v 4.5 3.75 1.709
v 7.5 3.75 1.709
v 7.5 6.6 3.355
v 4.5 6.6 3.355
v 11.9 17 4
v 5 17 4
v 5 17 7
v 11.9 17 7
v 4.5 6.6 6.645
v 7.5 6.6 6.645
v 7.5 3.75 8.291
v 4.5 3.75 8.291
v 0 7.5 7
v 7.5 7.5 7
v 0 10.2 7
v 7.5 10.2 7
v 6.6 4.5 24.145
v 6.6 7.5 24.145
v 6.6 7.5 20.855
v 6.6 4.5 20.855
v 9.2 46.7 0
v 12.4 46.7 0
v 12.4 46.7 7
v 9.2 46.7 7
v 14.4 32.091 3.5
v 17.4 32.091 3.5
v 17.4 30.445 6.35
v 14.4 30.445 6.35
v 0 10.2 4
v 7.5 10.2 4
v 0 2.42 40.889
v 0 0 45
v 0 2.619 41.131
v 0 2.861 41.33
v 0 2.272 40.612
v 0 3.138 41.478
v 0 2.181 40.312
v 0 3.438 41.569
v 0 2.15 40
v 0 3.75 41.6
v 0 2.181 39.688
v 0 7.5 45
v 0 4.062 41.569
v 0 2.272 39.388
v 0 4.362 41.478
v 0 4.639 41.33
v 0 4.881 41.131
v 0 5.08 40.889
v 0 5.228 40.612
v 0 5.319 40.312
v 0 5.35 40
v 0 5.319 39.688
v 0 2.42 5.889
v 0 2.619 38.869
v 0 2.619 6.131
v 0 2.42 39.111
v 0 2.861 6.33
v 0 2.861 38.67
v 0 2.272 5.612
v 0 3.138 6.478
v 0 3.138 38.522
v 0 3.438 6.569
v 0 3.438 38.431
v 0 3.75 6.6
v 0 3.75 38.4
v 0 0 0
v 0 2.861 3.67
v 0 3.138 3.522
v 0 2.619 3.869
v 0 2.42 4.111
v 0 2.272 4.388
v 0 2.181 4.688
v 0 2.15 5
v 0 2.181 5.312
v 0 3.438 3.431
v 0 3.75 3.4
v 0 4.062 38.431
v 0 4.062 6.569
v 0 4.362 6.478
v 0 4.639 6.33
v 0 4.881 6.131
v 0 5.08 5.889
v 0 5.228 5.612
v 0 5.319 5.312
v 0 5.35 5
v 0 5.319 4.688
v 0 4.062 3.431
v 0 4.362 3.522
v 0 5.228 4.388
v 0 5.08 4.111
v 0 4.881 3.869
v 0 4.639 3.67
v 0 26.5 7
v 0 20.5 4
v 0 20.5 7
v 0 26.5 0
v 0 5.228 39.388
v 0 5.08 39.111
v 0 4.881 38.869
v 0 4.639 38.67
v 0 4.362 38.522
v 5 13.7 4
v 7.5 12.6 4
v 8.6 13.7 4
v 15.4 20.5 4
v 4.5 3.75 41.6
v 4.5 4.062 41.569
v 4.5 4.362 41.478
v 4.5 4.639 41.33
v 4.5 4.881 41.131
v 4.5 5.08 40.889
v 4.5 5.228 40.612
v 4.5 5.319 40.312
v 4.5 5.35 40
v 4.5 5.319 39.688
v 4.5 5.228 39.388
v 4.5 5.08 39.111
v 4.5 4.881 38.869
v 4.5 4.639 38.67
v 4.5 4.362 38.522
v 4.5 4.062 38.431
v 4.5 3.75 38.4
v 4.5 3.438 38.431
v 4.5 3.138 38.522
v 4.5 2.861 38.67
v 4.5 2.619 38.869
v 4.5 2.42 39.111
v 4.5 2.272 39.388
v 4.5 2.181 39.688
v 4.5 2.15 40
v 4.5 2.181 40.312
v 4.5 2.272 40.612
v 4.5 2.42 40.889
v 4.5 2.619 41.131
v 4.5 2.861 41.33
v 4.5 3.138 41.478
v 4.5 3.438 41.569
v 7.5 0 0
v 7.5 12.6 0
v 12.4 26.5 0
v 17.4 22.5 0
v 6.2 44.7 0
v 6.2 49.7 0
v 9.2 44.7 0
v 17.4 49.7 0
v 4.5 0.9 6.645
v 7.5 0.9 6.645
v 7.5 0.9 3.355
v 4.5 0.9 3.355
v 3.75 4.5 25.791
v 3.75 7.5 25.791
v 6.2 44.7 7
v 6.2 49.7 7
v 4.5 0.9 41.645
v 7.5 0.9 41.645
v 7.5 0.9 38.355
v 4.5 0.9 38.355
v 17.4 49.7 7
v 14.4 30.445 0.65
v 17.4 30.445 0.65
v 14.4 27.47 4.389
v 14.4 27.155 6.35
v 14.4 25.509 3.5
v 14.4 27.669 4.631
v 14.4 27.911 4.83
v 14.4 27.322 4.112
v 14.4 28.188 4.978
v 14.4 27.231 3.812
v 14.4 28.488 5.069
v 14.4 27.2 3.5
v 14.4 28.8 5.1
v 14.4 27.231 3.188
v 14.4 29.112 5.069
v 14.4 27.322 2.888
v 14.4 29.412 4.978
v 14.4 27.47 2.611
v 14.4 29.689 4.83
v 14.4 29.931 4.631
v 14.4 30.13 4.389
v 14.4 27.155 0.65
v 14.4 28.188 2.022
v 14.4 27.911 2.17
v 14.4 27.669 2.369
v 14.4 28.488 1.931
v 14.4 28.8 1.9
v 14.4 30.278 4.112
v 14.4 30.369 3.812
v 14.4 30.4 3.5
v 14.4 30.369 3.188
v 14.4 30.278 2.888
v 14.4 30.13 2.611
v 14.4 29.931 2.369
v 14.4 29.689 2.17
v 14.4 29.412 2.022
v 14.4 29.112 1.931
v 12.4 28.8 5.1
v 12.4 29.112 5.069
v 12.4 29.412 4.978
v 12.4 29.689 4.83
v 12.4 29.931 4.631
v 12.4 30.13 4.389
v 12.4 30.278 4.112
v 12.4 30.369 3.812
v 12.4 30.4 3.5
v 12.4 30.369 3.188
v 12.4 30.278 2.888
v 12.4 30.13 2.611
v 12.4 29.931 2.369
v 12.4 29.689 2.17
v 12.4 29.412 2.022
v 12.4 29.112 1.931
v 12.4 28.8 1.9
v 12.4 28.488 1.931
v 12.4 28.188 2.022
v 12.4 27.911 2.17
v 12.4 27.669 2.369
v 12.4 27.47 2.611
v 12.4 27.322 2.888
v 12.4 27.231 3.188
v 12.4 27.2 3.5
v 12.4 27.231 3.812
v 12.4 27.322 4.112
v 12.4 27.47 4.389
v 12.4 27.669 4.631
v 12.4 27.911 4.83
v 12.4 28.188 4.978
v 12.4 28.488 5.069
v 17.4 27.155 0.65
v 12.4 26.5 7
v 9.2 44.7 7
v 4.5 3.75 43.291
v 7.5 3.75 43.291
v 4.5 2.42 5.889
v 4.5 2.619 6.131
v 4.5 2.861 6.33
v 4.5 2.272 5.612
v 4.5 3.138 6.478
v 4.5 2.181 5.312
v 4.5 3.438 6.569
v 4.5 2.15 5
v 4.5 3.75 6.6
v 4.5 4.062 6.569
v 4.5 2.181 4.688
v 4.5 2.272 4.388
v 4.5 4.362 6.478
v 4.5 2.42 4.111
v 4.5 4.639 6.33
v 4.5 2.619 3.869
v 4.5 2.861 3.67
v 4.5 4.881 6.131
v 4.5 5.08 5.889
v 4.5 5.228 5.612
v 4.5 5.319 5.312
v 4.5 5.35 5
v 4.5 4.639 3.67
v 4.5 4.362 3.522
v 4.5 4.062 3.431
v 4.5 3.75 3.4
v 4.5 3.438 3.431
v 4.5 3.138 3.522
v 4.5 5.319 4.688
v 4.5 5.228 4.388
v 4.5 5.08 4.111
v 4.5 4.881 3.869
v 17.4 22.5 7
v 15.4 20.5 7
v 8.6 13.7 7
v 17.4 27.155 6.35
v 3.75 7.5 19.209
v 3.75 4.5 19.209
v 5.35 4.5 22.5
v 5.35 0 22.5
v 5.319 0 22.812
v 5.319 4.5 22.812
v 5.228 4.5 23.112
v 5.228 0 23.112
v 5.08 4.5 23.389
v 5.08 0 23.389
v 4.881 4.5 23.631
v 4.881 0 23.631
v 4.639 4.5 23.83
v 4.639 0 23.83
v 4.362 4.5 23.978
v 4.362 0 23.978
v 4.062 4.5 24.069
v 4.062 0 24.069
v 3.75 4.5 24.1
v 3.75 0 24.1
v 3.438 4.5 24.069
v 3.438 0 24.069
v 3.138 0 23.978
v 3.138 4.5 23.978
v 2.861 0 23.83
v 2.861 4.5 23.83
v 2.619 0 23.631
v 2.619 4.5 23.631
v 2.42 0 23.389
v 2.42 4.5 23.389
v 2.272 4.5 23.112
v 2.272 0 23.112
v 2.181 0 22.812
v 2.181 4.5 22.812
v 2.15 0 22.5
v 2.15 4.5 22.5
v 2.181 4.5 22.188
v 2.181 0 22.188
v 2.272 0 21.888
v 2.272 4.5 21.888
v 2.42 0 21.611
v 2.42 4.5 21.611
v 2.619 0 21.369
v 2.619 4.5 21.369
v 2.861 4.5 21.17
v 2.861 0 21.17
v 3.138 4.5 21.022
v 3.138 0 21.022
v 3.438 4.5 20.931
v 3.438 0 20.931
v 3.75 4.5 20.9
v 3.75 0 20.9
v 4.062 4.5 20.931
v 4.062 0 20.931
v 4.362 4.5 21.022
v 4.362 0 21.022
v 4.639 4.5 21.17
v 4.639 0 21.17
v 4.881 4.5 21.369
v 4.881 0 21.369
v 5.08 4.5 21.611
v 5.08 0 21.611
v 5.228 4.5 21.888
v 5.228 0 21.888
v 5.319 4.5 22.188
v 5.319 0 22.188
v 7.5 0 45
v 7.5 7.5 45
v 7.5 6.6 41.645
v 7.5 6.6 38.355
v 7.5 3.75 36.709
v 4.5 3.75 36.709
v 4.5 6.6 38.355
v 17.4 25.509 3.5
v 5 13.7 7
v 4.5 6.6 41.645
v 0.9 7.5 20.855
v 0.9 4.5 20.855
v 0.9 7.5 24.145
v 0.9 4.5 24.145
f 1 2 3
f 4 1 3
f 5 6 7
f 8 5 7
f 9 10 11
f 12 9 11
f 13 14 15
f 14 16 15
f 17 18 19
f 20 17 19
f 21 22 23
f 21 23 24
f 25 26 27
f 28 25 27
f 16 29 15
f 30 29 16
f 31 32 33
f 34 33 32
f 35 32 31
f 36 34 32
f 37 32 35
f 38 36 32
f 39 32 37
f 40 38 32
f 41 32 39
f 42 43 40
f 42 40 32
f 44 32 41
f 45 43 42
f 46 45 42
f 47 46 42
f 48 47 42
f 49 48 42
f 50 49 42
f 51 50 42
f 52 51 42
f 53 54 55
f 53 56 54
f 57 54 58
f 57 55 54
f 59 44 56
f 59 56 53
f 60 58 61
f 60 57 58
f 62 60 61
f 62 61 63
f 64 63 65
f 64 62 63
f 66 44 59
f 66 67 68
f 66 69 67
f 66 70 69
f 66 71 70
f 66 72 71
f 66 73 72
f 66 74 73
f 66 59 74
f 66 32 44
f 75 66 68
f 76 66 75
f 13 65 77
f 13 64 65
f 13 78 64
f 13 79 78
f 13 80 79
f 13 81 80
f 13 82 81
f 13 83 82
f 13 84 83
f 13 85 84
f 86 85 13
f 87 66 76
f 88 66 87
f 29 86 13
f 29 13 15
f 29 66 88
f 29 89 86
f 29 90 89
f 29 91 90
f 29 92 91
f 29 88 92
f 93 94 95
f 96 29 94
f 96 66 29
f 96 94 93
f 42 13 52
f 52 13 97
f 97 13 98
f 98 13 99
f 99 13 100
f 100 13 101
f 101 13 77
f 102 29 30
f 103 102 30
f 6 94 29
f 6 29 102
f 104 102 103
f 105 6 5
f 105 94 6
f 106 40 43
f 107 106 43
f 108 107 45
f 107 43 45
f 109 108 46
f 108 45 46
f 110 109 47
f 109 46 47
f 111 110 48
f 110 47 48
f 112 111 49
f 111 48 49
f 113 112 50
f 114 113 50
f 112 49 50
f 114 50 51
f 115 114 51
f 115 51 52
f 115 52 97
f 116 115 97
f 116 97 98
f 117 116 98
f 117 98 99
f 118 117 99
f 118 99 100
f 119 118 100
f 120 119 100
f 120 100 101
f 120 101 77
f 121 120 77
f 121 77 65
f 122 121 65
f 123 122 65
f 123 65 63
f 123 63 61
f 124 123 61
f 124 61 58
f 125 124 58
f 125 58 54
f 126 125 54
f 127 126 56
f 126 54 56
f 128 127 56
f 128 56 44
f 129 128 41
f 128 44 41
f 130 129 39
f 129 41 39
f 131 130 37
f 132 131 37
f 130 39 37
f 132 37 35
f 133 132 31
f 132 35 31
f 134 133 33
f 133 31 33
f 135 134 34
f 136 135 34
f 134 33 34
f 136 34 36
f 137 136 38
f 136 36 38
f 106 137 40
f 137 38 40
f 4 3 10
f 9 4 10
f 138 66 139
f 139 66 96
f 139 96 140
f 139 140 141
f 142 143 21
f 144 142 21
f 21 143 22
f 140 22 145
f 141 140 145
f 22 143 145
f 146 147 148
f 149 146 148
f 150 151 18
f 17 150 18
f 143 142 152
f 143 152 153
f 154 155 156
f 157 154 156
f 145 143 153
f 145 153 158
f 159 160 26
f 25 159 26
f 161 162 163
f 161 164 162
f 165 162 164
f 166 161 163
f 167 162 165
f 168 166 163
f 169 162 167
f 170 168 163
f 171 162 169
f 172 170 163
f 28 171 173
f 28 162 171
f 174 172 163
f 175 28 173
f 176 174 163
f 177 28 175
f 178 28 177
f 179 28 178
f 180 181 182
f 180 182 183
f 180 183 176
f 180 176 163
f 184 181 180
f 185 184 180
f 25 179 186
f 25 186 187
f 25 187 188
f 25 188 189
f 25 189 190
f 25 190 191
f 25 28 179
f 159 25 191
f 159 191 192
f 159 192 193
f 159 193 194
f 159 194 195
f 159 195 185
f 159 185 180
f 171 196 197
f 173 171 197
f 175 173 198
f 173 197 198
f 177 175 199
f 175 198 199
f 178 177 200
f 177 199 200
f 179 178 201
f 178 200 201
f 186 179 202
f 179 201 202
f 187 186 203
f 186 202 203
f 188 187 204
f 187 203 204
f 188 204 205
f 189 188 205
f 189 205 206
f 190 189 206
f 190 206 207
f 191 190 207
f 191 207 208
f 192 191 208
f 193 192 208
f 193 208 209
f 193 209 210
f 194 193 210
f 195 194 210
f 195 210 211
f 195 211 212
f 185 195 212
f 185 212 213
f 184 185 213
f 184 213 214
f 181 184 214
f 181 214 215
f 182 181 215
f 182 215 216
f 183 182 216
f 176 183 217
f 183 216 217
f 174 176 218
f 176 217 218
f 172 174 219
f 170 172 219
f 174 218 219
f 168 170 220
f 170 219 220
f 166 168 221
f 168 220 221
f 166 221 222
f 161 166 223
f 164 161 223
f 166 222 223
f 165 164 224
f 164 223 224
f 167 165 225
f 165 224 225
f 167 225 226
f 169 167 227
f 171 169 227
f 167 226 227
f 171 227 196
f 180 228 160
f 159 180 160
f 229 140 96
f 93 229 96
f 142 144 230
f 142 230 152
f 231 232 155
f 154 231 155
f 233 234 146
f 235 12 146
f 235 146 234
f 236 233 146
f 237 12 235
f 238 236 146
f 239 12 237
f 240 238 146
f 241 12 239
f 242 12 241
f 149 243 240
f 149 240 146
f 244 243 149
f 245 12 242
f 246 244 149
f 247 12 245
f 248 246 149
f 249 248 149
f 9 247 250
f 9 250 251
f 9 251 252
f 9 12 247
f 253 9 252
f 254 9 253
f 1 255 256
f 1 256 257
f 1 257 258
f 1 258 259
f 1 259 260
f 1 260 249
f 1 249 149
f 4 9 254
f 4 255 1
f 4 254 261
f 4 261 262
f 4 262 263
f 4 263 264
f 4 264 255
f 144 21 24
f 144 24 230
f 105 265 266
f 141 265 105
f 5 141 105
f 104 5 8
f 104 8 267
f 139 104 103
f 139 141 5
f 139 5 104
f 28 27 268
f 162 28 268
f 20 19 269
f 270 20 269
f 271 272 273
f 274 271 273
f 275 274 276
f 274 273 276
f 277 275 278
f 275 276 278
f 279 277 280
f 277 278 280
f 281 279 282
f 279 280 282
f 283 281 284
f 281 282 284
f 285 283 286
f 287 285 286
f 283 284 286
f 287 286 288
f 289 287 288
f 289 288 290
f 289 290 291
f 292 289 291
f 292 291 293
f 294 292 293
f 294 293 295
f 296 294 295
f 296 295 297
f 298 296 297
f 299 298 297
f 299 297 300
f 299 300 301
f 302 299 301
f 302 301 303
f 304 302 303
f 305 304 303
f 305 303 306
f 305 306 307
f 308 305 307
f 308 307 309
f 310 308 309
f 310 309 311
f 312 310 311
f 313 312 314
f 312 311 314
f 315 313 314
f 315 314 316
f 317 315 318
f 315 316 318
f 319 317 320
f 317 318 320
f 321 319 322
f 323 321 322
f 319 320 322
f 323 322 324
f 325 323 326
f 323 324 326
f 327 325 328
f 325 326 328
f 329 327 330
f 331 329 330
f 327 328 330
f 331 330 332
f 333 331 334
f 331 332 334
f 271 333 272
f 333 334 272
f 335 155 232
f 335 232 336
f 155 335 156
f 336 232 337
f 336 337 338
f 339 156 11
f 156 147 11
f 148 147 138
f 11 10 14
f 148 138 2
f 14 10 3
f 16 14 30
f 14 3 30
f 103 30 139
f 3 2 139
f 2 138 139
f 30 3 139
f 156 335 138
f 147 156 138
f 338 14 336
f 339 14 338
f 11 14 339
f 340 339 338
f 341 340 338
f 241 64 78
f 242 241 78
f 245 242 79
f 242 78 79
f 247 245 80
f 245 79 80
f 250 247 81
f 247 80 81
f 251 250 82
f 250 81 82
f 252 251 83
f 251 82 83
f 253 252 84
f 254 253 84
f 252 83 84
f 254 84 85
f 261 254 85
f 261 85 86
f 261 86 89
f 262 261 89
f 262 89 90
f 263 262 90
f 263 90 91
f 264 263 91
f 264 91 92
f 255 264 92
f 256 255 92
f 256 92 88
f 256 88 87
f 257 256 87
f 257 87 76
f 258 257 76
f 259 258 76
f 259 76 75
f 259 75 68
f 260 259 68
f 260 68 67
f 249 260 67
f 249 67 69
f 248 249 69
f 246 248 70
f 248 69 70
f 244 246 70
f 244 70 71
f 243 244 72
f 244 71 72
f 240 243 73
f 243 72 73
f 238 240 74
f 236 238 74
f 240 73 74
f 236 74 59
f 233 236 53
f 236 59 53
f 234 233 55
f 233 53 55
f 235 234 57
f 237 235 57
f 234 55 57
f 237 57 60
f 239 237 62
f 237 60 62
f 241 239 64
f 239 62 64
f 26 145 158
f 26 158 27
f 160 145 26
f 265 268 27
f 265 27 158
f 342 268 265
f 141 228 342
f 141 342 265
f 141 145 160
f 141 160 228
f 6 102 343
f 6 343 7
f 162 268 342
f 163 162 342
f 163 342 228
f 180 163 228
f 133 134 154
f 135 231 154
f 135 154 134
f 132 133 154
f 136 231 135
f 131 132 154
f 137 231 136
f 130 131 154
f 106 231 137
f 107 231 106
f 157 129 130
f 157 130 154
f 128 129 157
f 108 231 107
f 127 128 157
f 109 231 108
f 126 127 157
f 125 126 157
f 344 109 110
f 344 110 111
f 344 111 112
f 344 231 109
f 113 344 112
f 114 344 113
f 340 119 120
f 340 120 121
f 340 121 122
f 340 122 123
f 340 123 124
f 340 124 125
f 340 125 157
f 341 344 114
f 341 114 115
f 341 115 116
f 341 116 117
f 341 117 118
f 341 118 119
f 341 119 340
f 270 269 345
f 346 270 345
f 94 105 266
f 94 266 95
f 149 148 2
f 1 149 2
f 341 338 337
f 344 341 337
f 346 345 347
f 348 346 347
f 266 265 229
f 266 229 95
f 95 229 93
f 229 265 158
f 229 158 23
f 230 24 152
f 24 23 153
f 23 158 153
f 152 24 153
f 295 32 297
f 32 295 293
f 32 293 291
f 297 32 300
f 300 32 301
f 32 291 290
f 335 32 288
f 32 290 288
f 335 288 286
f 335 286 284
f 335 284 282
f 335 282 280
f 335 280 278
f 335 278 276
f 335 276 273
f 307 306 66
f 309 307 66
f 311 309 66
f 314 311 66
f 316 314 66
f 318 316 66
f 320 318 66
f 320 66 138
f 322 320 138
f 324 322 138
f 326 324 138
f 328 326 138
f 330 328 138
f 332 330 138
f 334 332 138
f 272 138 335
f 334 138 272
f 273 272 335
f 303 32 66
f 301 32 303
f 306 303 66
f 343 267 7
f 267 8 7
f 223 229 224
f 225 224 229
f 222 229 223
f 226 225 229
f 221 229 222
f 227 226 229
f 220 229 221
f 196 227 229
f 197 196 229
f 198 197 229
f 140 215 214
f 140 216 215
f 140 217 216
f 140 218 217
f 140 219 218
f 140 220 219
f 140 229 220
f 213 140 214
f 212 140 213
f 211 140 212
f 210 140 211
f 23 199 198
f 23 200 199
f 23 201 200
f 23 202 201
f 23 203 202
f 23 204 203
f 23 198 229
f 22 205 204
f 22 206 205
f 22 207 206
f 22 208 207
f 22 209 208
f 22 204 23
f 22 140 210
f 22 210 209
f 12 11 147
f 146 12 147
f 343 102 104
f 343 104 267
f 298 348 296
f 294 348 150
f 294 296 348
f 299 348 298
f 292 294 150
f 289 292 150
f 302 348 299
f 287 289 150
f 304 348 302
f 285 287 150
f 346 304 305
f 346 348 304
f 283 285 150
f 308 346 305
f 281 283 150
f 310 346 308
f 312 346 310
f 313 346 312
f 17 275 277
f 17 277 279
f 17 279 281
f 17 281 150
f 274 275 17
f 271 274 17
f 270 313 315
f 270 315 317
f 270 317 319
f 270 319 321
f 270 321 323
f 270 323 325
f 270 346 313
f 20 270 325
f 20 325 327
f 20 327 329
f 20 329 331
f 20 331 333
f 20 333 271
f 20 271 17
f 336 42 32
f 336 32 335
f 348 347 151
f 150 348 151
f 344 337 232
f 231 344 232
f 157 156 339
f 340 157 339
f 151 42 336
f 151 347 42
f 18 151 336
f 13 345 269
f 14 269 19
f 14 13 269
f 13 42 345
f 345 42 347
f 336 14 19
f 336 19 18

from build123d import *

# Parameters (mm, degrees)
SALIENTE_EXTRUIR1_DEPTH = 4
SALIENTE_EXTRUIR2_DEPTH = 3
CROQUIS3_W              = 7.5
CROQUIS3_H              = 7.5
SALIENTE_EXTRUIR3_DEPTH = 38
CORTAR_EXTRUIR1_REACH   = 7
CROQUIS4_R              = 1.6
CORTAR_EXTRUIR2_DEPTH   = 3
CORTAR_EXTRUIR3_REACH   = 19.4
CROQUIS6_R              = 1.6
CORTAR_EXTRUIR4_DEPTH   = 3
CORTAR_EXTRUIR5_REACH   = 51.7
CROQUIS8_R              = 1.6
CORTAR_EXTRUIR6_DEPTH   = 3
CORTAR_EXTRUIR7_REACH   = 14.4
CROQUIS10_W             = 3
CROQUIS10_H             = 3.5


with BuildPart() as part:
    # Croquis1 → Saliente-Extruir1 (new body)
    with BuildSketch(Plane.XY):
        Polygon((0, 26.5), (0, 0), (7.5, 0), (7.5, 12.6), (17.4, 22.5), (17.4, 49.7), (6.2, 49.7), (6.2, 44.7), (9.2, 44.7), (9.2, 46.7), (12.4, 46.7), (12.4, 26.5), align=None)
    extrude(amount=SALIENTE_EXTRUIR1_DEPTH)

    # Croquis2 → Saliente-Extruir2 (add)
    with BuildSketch(Plane.XY.offset(4)):
        Polygon((0, 0), (0, 10.2), (5, 10.2), (5, 20.5), (0, 20.5), (0, 26.5), (12.4, 26.5), (12.4, 46.7), (9.2, 46.7), (9.2, 44.7), (6.2, 44.7), (6.2, 49.7), (17.4, 49.7), (17.4, 22.5), (7.5, 12.6), (7.5, 0), align=None)
    extrude(amount=SALIENTE_EXTRUIR2_DEPTH)

    # Croquis3 → Saliente-Extruir3 (add)
    with BuildSketch(Plane.XY.offset(7)):
        with Locations((3.75, 3.75)):
            Rectangle(CROQUIS3_W, CROQUIS3_H)
    extrude(amount=SALIENTE_EXTRUIR3_DEPTH)

    # Croquis4 → Cortar-Extruir1 (cut, up to next)
    with BuildSketch(Plane.ZY.offset(-12.4), mode=Mode.PRIVATE) as cortar_extruir1_sk1:
        with Locations((3.5, 28.8)):
            Circle(CROQUIS4_R)
    cortar_extruir1_tool1 = extrude(cortar_extruir1_sk1.sketch, amount=-CORTAR_EXTRUIR1_REACH, mode=Mode.PRIVATE) & part.part
    add(cortar_extruir1_tool1.solids().sort_by_distance((12.4, 28.8, 3.5))[0], mode=Mode.SUBTRACT)

    # Croquis5 → Cortar-Extruir2 (cut)
    with BuildSketch(Plane(origin=(17.4, 0, 0), x_dir=(0, 0, -1), z_dir=(1, 0, 0))):
        Polygon((-0.65, 30.445448267), (-3.5, 32.090896534), (-6.35, 30.445448267), (-6.35, 27.154551733), (-3.5, 25.509103466), (-0.65, 27.154551733), align=None)
    extrude(amount=-CORTAR_EXTRUIR2_DEPTH, mode=Mode.SUBTRACT)

    # Croquis6 → Cortar-Extruir3 (cut, up to next)
    with BuildSketch(Plane.ZY, mode=Mode.PRIVATE) as cortar_extruir3_sk1:
        with Locations((5, 3.75)):
            Circle(CROQUIS6_R)
    cortar_extruir3_tool1 = extrude(cortar_extruir3_sk1.sketch, amount=-CORTAR_EXTRUIR3_REACH, mode=Mode.PRIVATE) & part.part
    add(cortar_extruir3_tool1.solids().sort_by_distance((0, 3.75, 5))[0], mode=Mode.SUBTRACT)
    # Croquis6 → Cortar-Extruir3 (cut, up to next)
    with BuildSketch(Plane.ZY, mode=Mode.PRIVATE) as cortar_extruir3_sk2:
        with Locations((40, 3.75)):
            Circle(CROQUIS6_R)
    cortar_extruir3_tool2 = extrude(cortar_extruir3_sk2.sketch, amount=-CORTAR_EXTRUIR3_REACH, mode=Mode.PRIVATE) & part.part
    add(cortar_extruir3_tool2.solids().sort_by_distance((0, 3.75, 40))[0], mode=Mode.SUBTRACT)

    # Croquis7 → Cortar-Extruir4 (cut)
    with BuildSketch(Plane(origin=(7.5, 0, 0), x_dir=(0, 0, -1), z_dir=(1, 0, 0))):
        Polygon((-3.354551733, 6.6), (-6.645448267, 6.6), (-8.290896534, 3.75), (-6.645448267, 0.9), (-3.354551733, 0.9), (-1.709103466, 3.75), align=None)
        Polygon((-38.354551733, 6.6), (-41.645448267, 6.6), (-43.290896534, 3.75), (-41.645448267, 0.9), (-38.354551733, 0.9), (-36.709103466, 3.75), align=None)
    extrude(amount=-CORTAR_EXTRUIR4_DEPTH, mode=Mode.SUBTRACT)

    # Croquis8 → Cortar-Extruir5 (cut, up to next)
    with BuildSketch(Plane.XZ, mode=Mode.PRIVATE) as cortar_extruir5_sk1:
        with Locations((3.75, 22.5)):
            Circle(CROQUIS8_R)
    cortar_extruir5_tool1 = extrude(cortar_extruir5_sk1.sketch, amount=-CORTAR_EXTRUIR5_REACH, mode=Mode.PRIVATE) & part.part
    add(cortar_extruir5_tool1.solids().sort_by_distance((3.75, 0, 22.5))[0], mode=Mode.SUBTRACT)

    # Croquis9 → Cortar-Extruir6 (cut)
    with BuildSketch(Plane(origin=(0, 7.5, 0), x_dir=(1, 0, 0), z_dir=(0, 1, 0))):
        Polygon((0.9, -20.854551733), (0.9, -24.145448267), (3.75, -25.790896534), (6.6, -24.145448267), (6.6, -20.854551733), (3.75, -19.209103466), align=None)
    extrude(amount=-CORTAR_EXTRUIR6_DEPTH, mode=Mode.SUBTRACT)

    # Croquis10 → Cortar-Extruir7 (cut, up to next)
    with BuildSketch(Plane.ZY.offset(-5), mode=Mode.PRIVATE) as cortar_extruir7_sk1:
        with Locations((5.5, 11.95)):
            Rectangle(CROQUIS10_W, CROQUIS10_H)
    cortar_extruir7_tool1 = extrude(cortar_extruir7_sk1.sketch, amount=-CORTAR_EXTRUIR7_REACH, mode=Mode.PRIVATE) & part.part
    add(cortar_extruir7_tool1.solids().sort_by_distance((5, 11.95, 5.5))[0], mode=Mode.SUBTRACT)
    # Croquis10 → Cortar-Extruir7 (cut, up to next)
    with BuildSketch(Plane.ZY.offset(-5), mode=Mode.PRIVATE) as cortar_extruir7_sk2:
        with Locations((5.5, 18.75)):
            Rectangle(CROQUIS10_W, CROQUIS10_H)
    cortar_extruir7_tool2 = extrude(cortar_extruir7_sk2.sketch, amount=-CORTAR_EXTRUIR7_REACH, mode=Mode.PRIVATE) & part.part
    add(cortar_extruir7_tool2.solids().sort_by_distance((5, 18.75, 5.5))[0], mode=Mode.SUBTRACT)


solid = part.part
